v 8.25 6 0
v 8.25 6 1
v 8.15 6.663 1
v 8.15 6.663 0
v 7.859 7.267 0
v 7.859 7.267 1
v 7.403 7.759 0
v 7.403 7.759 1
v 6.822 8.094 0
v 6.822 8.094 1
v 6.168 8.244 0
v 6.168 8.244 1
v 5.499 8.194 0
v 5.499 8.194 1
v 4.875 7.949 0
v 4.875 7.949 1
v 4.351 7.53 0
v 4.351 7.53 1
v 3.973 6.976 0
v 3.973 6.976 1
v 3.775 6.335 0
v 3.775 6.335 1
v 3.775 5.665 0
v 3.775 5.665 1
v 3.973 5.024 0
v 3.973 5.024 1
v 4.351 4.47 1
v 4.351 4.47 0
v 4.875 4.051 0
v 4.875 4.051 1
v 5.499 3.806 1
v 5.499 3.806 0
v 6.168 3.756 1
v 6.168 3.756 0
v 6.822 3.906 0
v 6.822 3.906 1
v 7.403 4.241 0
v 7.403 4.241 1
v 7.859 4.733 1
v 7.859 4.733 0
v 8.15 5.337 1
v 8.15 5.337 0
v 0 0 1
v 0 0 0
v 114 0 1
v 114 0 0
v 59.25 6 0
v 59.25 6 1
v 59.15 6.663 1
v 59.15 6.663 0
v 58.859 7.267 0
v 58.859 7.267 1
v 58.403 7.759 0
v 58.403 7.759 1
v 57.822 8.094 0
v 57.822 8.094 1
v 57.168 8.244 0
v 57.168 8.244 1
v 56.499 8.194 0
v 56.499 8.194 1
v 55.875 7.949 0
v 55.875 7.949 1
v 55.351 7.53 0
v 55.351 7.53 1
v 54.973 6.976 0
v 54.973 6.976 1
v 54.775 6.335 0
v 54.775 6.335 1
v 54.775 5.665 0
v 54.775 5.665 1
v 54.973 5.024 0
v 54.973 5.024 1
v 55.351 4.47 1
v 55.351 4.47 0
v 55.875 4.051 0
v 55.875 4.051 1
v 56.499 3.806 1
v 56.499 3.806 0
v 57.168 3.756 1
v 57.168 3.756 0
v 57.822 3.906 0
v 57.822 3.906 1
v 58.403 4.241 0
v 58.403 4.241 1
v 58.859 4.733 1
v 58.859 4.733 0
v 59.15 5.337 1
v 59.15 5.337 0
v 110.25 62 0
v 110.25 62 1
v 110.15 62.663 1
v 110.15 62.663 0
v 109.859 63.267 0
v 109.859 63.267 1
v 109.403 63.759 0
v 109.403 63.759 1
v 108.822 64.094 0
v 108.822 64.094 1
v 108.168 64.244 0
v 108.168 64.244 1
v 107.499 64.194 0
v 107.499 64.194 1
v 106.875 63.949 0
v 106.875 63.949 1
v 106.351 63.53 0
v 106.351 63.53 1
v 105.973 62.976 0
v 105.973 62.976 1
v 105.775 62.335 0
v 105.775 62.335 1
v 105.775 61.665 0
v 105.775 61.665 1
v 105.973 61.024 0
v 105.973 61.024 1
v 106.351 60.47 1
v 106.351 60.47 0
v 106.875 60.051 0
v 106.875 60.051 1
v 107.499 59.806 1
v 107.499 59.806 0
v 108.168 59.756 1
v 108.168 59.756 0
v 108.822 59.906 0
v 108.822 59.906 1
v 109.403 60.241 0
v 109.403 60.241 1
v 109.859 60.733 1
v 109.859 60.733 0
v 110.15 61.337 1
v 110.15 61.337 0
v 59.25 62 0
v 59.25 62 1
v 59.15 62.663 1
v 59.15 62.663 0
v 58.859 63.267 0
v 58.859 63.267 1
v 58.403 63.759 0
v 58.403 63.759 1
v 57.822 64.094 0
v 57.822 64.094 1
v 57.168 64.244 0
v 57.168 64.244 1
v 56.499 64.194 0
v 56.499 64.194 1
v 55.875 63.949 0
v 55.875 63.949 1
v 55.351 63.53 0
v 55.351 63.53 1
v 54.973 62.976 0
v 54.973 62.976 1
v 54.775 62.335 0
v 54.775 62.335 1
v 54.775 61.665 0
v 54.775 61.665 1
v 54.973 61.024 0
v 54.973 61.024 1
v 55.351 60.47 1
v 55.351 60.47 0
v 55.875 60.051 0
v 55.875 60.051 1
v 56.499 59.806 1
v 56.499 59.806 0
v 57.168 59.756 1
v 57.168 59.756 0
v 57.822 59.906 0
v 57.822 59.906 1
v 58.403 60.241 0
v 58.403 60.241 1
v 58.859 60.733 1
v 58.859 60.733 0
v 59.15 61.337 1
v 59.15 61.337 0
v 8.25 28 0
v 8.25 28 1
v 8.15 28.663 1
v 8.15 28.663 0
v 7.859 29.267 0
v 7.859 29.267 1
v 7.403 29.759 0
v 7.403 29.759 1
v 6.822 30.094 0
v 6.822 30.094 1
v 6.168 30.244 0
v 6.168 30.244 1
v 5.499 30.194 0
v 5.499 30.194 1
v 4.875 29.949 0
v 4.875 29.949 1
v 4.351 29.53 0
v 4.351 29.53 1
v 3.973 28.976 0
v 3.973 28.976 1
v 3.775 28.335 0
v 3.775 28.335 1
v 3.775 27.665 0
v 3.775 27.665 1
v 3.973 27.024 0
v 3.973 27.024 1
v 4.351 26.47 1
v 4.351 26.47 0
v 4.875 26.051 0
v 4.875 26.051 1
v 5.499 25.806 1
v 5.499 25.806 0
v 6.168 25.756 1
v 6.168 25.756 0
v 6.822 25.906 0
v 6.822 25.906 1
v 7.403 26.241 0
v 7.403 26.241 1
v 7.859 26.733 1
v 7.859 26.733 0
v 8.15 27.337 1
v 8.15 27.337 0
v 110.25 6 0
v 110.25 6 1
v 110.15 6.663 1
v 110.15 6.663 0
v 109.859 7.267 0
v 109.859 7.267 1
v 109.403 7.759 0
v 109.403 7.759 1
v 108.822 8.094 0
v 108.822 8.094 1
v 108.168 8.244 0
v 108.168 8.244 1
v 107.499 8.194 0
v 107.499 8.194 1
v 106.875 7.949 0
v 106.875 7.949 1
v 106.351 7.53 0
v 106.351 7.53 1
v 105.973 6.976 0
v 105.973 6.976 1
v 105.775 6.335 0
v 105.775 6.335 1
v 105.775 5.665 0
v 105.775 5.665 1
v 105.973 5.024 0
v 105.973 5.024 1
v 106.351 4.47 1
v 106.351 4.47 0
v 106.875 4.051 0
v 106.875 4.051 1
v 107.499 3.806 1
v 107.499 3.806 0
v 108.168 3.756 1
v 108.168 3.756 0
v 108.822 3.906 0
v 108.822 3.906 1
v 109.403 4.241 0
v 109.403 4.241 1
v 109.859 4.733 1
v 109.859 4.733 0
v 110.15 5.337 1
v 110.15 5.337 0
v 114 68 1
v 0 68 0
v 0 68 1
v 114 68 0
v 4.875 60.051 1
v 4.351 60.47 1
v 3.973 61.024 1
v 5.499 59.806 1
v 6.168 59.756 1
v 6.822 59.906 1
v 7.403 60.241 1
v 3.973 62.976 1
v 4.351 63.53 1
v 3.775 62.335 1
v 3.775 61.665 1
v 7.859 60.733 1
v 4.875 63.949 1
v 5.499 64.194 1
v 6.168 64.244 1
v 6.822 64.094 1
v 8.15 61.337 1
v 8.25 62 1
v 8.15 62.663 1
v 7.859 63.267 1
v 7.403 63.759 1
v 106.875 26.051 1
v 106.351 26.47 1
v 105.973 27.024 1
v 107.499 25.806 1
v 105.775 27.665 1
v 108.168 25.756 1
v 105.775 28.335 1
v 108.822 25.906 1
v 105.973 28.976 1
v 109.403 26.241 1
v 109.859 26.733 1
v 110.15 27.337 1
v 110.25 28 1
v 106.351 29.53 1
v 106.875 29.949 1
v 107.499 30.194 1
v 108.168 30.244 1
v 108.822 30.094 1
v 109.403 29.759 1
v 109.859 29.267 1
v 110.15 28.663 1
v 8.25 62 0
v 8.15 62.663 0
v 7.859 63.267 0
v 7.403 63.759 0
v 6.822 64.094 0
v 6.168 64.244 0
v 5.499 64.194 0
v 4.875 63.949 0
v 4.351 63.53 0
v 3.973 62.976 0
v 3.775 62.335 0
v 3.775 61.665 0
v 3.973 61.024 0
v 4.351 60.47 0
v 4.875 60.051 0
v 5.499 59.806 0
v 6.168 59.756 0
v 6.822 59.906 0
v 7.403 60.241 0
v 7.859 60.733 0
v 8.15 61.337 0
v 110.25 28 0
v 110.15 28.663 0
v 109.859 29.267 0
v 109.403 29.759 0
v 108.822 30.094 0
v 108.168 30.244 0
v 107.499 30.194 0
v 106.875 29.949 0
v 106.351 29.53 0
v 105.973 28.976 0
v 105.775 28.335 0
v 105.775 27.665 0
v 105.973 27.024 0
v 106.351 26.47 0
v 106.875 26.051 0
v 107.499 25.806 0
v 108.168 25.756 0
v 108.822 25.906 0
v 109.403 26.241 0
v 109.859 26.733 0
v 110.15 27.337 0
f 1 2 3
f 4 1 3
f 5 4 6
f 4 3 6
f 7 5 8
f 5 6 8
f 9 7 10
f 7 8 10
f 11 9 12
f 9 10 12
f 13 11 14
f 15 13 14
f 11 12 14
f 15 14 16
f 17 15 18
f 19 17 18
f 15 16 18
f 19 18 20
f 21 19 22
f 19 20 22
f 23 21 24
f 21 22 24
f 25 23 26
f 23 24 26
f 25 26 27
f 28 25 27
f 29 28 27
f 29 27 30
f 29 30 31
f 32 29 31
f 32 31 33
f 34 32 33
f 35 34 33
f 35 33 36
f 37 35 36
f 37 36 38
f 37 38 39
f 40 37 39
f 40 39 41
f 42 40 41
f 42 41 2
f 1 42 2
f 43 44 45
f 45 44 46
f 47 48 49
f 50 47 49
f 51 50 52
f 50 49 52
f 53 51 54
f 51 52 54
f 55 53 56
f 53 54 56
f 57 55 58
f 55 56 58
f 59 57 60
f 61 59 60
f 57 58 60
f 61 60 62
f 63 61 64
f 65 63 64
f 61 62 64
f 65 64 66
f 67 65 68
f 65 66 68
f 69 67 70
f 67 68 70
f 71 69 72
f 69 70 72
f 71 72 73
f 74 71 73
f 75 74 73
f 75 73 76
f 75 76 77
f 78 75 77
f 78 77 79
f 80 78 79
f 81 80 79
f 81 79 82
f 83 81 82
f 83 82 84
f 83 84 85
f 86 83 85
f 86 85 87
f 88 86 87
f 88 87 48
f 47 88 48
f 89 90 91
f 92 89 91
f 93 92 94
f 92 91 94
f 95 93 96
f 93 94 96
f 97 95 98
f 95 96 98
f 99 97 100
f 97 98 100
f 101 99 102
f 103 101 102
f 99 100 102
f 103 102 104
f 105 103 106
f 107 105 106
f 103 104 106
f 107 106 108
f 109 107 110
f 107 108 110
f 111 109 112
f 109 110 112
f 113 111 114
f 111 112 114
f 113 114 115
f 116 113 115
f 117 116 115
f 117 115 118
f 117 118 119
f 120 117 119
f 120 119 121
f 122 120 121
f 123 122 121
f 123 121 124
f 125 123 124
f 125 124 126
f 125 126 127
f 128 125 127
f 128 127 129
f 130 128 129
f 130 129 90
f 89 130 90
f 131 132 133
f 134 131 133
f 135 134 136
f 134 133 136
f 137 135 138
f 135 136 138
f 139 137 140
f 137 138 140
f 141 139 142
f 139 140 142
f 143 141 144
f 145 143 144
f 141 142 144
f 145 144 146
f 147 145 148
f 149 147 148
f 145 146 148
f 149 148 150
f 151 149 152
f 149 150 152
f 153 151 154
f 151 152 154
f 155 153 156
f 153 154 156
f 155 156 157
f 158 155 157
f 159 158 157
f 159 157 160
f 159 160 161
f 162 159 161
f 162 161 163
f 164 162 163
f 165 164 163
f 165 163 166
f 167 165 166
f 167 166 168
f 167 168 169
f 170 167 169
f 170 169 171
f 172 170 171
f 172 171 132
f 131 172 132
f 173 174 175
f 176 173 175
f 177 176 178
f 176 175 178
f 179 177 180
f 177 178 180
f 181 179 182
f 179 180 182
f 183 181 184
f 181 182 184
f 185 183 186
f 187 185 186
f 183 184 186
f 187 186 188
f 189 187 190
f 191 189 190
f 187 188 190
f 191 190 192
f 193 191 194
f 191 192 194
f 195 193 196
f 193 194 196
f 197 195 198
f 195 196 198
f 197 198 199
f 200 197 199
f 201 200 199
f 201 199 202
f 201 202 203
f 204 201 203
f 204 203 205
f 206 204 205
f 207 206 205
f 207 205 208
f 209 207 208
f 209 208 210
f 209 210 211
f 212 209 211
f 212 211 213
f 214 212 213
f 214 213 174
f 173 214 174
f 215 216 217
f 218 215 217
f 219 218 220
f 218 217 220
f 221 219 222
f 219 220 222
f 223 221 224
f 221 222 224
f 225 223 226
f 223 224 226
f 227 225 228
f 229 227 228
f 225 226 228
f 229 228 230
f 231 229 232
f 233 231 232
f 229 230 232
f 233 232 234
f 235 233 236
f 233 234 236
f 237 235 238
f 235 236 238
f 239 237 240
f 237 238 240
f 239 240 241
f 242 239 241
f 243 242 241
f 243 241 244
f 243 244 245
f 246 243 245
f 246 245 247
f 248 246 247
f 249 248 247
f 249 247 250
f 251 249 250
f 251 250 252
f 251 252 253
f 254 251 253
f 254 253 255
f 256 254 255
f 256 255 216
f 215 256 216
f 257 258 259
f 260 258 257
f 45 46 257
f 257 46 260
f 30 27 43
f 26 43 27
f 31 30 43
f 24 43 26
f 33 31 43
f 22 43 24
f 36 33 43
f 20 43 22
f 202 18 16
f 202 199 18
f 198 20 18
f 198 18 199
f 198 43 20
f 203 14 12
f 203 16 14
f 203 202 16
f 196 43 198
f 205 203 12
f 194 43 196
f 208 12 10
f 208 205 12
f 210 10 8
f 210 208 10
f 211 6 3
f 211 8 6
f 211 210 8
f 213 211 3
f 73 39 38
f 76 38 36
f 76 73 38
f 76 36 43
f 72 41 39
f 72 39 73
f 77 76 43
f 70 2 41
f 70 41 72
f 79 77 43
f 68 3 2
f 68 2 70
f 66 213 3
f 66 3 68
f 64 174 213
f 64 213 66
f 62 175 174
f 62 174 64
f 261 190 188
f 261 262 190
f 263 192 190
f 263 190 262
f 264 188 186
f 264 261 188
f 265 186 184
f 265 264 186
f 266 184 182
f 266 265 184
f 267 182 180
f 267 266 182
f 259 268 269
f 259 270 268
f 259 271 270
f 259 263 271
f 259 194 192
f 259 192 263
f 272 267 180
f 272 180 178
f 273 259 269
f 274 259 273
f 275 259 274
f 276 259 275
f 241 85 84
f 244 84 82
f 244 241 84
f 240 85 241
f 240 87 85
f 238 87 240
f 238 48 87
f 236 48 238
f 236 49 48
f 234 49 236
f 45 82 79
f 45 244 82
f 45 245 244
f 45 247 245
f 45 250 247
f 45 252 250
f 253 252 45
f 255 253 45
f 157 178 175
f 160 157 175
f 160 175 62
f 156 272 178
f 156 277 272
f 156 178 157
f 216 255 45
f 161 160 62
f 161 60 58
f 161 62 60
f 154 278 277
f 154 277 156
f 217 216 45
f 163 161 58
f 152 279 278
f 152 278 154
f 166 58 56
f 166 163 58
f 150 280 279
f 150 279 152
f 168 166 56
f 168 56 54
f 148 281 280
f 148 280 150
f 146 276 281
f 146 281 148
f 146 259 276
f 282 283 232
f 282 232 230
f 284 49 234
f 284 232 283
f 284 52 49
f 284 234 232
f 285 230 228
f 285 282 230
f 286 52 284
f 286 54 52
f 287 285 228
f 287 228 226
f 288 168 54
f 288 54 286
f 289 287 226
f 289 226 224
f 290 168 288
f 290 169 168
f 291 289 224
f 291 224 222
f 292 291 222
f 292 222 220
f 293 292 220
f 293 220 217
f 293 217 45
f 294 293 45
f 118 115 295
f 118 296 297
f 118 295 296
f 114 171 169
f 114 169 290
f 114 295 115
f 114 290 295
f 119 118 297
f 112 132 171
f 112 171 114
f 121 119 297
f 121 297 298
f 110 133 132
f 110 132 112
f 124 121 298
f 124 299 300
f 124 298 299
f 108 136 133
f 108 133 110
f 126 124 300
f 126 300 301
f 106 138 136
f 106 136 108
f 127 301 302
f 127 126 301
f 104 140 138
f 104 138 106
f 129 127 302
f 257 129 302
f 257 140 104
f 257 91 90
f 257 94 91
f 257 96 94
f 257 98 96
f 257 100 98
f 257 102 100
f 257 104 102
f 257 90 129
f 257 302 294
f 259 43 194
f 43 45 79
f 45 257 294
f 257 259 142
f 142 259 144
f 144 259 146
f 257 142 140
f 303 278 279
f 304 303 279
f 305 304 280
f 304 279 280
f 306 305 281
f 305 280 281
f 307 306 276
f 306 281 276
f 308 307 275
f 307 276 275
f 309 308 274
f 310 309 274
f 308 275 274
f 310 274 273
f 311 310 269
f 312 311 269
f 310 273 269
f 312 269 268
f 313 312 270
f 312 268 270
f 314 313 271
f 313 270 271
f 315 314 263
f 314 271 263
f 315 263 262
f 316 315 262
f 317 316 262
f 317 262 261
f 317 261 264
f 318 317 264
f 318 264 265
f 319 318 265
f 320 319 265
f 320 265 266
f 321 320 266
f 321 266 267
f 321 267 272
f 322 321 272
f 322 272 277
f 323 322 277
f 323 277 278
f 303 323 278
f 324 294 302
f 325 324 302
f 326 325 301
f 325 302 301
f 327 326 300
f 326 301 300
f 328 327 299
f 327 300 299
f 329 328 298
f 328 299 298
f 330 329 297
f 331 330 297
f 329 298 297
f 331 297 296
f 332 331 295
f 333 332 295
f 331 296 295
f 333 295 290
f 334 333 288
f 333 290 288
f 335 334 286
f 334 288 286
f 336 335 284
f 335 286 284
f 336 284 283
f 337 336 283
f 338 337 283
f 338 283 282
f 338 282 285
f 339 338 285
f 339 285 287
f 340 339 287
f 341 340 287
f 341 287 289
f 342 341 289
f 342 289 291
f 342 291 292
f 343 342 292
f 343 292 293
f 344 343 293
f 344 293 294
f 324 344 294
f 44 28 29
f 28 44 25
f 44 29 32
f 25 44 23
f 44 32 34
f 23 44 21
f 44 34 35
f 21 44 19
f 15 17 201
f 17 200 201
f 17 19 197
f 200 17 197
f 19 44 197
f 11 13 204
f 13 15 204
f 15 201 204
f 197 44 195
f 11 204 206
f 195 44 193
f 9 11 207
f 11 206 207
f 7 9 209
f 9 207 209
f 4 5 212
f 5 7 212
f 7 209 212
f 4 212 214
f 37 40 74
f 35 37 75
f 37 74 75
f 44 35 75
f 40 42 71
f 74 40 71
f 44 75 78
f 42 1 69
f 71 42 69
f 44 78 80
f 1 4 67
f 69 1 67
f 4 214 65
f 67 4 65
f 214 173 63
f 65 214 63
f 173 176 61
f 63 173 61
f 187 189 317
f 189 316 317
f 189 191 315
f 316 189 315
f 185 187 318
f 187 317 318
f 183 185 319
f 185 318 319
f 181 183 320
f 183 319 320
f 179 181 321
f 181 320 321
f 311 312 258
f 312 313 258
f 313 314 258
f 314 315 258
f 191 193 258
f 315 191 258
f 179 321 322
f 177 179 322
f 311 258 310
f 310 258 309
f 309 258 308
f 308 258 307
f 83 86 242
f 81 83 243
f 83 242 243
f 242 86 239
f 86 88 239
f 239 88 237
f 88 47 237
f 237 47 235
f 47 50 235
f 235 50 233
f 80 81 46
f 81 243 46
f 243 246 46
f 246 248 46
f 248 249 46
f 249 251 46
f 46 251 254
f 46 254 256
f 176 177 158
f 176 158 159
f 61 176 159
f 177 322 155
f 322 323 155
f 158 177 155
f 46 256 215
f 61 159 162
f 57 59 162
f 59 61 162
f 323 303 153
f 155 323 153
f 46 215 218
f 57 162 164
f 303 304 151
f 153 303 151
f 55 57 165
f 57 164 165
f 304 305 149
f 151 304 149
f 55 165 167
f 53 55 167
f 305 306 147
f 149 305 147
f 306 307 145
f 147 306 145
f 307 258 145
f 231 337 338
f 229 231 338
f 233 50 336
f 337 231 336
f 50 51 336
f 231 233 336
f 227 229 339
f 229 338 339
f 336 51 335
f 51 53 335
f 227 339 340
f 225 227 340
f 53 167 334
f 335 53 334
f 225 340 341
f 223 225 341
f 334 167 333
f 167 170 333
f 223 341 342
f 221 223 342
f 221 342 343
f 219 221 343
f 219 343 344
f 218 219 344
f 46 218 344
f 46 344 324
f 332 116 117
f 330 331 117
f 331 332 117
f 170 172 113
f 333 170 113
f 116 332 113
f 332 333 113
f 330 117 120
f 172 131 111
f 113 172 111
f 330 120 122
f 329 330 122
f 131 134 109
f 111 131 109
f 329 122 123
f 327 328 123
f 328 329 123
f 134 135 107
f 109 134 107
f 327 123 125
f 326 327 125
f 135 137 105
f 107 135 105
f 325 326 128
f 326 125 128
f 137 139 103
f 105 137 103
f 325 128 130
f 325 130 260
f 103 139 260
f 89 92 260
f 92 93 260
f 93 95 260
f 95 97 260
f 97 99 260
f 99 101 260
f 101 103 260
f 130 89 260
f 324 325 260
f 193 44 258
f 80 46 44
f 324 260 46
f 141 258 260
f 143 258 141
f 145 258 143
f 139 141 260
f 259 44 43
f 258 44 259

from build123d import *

# Parameters (mm, degrees)
SKETCH_1_W          = 114
SKETCH_1_H          = 68
EXTRUDE_1_DEPTH     = 1
CUT_EXTRUDE_1_REACH = 3
SKETCH_2_R          = 2.25


with BuildPart() as part:
    # Эскиз1 → Бобышка-Вытянуть1 (new body)
    with BuildSketch(Plane.XY):
        with Locations((57, 34)):
            Rectangle(SKETCH_1_W, SKETCH_1_H)
    extrude(amount=EXTRUDE_1_DEPTH)

    # Эскиз2 → Вырез-Вытянуть1 (cut, up to next)
    with BuildSketch(Plane.XY.offset(1), mode=Mode.PRIVATE) as cut_extrude_1_sk1:
        with Locations((6, 62)):
            Circle(SKETCH_2_R)
    cut_extrude_1_tool1 = extrude(cut_extrude_1_sk1.sketch, amount=-CUT_EXTRUDE_1_REACH, mode=Mode.PRIVATE) & part.part
    add(cut_extrude_1_tool1.solids().sort_by_distance((6, 62, 1))[0], mode=Mode.SUBTRACT)
    # Эскиз2 → Вырез-Вытянуть1 (cut, up to next)
    with BuildSketch(Plane.XY.offset(1), mode=Mode.PRIVATE) as cut_extrude_1_sk2:
        with Locations((6, 28)):
            Circle(SKETCH_2_R)
    cut_extrude_1_tool2 = extrude(cut_extrude_1_sk2.sketch, amount=-CUT_EXTRUDE_1_REACH, mode=Mode.PRIVATE) & part.part
    add(cut_extrude_1_tool2.solids().sort_by_distance((6, 28, 1))[0], mode=Mode.SUBTRACT)
    # Эскиз2 → Вырез-Вытянуть1 (cut, up to next)
    with BuildSketch(Plane.XY.offset(1), mode=Mode.PRIVATE) as cut_extrude_1_sk3:
        with Locations((6, 6)):
            Circle(SKETCH_2_R)
    cut_extrude_1_tool3 = extrude(cut_extrude_1_sk3.sketch, amount=-CUT_EXTRUDE_1_REACH, mode=Mode.PRIVATE) & part.part
    add(cut_extrude_1_tool3.solids().sort_by_distance((6, 6, 1))[0], mode=Mode.SUBTRACT)
    # Эскиз2 → Вырез-Вытянуть1 (cut, up to next)
    with BuildSketch(Plane.XY.offset(1), mode=Mode.PRIVATE) as cut_extrude_1_sk4:
        with Locations((57, 6)):
            Circle(SKETCH_2_R)
    cut_extrude_1_tool4 = extrude(cut_extrude_1_sk4.sketch, amount=-CUT_EXTRUDE_1_REACH, mode=Mode.PRIVATE) & part.part
    add(cut_extrude_1_tool4.solids().sort_by_distance((57, 6, 1))[0], mode=Mode.SUBTRACT)
    # Эскиз2 → Вырез-Вытянуть1 (cut, up to next)
    with BuildSketch(Plane.XY.offset(1), mode=Mode.PRIVATE) as cut_extrude_1_sk5:
        with Locations((57, 62)):
            Circle(SKETCH_2_R)
    cut_extrude_1_tool5 = extrude(cut_extrude_1_sk5.sketch, amount=-CUT_EXTRUDE_1_REACH, mode=Mode.PRIVATE) & part.part
    add(cut_extrude_1_tool5.solids().sort_by_distance((57, 62, 1))[0], mode=Mode.SUBTRACT)
    # Эскиз2 → Вырез-Вытянуть1 (cut, up to next)
    with BuildSketch(Plane.XY.offset(1), mode=Mode.PRIVATE) as cut_extrude_1_sk6:
        with Locations((108, 62)):
            Circle(SKETCH_2_R)
    cut_extrude_1_tool6 = extrude(cut_extrude_1_sk6.sketch, amount=-CUT_EXTRUDE_1_REACH, mode=Mode.PRIVATE) & part.part
    add(cut_extrude_1_tool6.solids().sort_by_distance((108, 62, 1))[0], mode=Mode.SUBTRACT)
    # Эскиз2 → Вырез-Вытянуть1 (cut, up to next)
    with BuildSketch(Plane.XY.offset(1), mode=Mode.PRIVATE) as cut_extrude_1_sk7:
        with Locations((108, 28)):
            Circle(SKETCH_2_R)
    cut_extrude_1_tool7 = extrude(cut_extrude_1_sk7.sketch, amount=-CUT_EXTRUDE_1_REACH, mode=Mode.PRIVATE) & part.part
    add(cut_extrude_1_tool7.solids().sort_by_distance((108, 28, 1))[0], mode=Mode.SUBTRACT)
    # Эскиз2 → Вырез-Вытянуть1 (cut, up to next)
    with BuildSketch(Plane.XY.offset(1), mode=Mode.PRIVATE) as cut_extrude_1_sk8:
        with Locations((108, 6)):
            Circle(SKETCH_2_R)
    cut_extrude_1_tool8 = extrude(cut_extrude_1_sk8.sketch, amount=-CUT_EXTRUDE_1_REACH, mode=Mode.PRIVATE) & part.part
    add(cut_extrude_1_tool8.solids().sort_by_distance((108, 6, 1))[0], mode=Mode.SUBTRACT)


solid = part.part
